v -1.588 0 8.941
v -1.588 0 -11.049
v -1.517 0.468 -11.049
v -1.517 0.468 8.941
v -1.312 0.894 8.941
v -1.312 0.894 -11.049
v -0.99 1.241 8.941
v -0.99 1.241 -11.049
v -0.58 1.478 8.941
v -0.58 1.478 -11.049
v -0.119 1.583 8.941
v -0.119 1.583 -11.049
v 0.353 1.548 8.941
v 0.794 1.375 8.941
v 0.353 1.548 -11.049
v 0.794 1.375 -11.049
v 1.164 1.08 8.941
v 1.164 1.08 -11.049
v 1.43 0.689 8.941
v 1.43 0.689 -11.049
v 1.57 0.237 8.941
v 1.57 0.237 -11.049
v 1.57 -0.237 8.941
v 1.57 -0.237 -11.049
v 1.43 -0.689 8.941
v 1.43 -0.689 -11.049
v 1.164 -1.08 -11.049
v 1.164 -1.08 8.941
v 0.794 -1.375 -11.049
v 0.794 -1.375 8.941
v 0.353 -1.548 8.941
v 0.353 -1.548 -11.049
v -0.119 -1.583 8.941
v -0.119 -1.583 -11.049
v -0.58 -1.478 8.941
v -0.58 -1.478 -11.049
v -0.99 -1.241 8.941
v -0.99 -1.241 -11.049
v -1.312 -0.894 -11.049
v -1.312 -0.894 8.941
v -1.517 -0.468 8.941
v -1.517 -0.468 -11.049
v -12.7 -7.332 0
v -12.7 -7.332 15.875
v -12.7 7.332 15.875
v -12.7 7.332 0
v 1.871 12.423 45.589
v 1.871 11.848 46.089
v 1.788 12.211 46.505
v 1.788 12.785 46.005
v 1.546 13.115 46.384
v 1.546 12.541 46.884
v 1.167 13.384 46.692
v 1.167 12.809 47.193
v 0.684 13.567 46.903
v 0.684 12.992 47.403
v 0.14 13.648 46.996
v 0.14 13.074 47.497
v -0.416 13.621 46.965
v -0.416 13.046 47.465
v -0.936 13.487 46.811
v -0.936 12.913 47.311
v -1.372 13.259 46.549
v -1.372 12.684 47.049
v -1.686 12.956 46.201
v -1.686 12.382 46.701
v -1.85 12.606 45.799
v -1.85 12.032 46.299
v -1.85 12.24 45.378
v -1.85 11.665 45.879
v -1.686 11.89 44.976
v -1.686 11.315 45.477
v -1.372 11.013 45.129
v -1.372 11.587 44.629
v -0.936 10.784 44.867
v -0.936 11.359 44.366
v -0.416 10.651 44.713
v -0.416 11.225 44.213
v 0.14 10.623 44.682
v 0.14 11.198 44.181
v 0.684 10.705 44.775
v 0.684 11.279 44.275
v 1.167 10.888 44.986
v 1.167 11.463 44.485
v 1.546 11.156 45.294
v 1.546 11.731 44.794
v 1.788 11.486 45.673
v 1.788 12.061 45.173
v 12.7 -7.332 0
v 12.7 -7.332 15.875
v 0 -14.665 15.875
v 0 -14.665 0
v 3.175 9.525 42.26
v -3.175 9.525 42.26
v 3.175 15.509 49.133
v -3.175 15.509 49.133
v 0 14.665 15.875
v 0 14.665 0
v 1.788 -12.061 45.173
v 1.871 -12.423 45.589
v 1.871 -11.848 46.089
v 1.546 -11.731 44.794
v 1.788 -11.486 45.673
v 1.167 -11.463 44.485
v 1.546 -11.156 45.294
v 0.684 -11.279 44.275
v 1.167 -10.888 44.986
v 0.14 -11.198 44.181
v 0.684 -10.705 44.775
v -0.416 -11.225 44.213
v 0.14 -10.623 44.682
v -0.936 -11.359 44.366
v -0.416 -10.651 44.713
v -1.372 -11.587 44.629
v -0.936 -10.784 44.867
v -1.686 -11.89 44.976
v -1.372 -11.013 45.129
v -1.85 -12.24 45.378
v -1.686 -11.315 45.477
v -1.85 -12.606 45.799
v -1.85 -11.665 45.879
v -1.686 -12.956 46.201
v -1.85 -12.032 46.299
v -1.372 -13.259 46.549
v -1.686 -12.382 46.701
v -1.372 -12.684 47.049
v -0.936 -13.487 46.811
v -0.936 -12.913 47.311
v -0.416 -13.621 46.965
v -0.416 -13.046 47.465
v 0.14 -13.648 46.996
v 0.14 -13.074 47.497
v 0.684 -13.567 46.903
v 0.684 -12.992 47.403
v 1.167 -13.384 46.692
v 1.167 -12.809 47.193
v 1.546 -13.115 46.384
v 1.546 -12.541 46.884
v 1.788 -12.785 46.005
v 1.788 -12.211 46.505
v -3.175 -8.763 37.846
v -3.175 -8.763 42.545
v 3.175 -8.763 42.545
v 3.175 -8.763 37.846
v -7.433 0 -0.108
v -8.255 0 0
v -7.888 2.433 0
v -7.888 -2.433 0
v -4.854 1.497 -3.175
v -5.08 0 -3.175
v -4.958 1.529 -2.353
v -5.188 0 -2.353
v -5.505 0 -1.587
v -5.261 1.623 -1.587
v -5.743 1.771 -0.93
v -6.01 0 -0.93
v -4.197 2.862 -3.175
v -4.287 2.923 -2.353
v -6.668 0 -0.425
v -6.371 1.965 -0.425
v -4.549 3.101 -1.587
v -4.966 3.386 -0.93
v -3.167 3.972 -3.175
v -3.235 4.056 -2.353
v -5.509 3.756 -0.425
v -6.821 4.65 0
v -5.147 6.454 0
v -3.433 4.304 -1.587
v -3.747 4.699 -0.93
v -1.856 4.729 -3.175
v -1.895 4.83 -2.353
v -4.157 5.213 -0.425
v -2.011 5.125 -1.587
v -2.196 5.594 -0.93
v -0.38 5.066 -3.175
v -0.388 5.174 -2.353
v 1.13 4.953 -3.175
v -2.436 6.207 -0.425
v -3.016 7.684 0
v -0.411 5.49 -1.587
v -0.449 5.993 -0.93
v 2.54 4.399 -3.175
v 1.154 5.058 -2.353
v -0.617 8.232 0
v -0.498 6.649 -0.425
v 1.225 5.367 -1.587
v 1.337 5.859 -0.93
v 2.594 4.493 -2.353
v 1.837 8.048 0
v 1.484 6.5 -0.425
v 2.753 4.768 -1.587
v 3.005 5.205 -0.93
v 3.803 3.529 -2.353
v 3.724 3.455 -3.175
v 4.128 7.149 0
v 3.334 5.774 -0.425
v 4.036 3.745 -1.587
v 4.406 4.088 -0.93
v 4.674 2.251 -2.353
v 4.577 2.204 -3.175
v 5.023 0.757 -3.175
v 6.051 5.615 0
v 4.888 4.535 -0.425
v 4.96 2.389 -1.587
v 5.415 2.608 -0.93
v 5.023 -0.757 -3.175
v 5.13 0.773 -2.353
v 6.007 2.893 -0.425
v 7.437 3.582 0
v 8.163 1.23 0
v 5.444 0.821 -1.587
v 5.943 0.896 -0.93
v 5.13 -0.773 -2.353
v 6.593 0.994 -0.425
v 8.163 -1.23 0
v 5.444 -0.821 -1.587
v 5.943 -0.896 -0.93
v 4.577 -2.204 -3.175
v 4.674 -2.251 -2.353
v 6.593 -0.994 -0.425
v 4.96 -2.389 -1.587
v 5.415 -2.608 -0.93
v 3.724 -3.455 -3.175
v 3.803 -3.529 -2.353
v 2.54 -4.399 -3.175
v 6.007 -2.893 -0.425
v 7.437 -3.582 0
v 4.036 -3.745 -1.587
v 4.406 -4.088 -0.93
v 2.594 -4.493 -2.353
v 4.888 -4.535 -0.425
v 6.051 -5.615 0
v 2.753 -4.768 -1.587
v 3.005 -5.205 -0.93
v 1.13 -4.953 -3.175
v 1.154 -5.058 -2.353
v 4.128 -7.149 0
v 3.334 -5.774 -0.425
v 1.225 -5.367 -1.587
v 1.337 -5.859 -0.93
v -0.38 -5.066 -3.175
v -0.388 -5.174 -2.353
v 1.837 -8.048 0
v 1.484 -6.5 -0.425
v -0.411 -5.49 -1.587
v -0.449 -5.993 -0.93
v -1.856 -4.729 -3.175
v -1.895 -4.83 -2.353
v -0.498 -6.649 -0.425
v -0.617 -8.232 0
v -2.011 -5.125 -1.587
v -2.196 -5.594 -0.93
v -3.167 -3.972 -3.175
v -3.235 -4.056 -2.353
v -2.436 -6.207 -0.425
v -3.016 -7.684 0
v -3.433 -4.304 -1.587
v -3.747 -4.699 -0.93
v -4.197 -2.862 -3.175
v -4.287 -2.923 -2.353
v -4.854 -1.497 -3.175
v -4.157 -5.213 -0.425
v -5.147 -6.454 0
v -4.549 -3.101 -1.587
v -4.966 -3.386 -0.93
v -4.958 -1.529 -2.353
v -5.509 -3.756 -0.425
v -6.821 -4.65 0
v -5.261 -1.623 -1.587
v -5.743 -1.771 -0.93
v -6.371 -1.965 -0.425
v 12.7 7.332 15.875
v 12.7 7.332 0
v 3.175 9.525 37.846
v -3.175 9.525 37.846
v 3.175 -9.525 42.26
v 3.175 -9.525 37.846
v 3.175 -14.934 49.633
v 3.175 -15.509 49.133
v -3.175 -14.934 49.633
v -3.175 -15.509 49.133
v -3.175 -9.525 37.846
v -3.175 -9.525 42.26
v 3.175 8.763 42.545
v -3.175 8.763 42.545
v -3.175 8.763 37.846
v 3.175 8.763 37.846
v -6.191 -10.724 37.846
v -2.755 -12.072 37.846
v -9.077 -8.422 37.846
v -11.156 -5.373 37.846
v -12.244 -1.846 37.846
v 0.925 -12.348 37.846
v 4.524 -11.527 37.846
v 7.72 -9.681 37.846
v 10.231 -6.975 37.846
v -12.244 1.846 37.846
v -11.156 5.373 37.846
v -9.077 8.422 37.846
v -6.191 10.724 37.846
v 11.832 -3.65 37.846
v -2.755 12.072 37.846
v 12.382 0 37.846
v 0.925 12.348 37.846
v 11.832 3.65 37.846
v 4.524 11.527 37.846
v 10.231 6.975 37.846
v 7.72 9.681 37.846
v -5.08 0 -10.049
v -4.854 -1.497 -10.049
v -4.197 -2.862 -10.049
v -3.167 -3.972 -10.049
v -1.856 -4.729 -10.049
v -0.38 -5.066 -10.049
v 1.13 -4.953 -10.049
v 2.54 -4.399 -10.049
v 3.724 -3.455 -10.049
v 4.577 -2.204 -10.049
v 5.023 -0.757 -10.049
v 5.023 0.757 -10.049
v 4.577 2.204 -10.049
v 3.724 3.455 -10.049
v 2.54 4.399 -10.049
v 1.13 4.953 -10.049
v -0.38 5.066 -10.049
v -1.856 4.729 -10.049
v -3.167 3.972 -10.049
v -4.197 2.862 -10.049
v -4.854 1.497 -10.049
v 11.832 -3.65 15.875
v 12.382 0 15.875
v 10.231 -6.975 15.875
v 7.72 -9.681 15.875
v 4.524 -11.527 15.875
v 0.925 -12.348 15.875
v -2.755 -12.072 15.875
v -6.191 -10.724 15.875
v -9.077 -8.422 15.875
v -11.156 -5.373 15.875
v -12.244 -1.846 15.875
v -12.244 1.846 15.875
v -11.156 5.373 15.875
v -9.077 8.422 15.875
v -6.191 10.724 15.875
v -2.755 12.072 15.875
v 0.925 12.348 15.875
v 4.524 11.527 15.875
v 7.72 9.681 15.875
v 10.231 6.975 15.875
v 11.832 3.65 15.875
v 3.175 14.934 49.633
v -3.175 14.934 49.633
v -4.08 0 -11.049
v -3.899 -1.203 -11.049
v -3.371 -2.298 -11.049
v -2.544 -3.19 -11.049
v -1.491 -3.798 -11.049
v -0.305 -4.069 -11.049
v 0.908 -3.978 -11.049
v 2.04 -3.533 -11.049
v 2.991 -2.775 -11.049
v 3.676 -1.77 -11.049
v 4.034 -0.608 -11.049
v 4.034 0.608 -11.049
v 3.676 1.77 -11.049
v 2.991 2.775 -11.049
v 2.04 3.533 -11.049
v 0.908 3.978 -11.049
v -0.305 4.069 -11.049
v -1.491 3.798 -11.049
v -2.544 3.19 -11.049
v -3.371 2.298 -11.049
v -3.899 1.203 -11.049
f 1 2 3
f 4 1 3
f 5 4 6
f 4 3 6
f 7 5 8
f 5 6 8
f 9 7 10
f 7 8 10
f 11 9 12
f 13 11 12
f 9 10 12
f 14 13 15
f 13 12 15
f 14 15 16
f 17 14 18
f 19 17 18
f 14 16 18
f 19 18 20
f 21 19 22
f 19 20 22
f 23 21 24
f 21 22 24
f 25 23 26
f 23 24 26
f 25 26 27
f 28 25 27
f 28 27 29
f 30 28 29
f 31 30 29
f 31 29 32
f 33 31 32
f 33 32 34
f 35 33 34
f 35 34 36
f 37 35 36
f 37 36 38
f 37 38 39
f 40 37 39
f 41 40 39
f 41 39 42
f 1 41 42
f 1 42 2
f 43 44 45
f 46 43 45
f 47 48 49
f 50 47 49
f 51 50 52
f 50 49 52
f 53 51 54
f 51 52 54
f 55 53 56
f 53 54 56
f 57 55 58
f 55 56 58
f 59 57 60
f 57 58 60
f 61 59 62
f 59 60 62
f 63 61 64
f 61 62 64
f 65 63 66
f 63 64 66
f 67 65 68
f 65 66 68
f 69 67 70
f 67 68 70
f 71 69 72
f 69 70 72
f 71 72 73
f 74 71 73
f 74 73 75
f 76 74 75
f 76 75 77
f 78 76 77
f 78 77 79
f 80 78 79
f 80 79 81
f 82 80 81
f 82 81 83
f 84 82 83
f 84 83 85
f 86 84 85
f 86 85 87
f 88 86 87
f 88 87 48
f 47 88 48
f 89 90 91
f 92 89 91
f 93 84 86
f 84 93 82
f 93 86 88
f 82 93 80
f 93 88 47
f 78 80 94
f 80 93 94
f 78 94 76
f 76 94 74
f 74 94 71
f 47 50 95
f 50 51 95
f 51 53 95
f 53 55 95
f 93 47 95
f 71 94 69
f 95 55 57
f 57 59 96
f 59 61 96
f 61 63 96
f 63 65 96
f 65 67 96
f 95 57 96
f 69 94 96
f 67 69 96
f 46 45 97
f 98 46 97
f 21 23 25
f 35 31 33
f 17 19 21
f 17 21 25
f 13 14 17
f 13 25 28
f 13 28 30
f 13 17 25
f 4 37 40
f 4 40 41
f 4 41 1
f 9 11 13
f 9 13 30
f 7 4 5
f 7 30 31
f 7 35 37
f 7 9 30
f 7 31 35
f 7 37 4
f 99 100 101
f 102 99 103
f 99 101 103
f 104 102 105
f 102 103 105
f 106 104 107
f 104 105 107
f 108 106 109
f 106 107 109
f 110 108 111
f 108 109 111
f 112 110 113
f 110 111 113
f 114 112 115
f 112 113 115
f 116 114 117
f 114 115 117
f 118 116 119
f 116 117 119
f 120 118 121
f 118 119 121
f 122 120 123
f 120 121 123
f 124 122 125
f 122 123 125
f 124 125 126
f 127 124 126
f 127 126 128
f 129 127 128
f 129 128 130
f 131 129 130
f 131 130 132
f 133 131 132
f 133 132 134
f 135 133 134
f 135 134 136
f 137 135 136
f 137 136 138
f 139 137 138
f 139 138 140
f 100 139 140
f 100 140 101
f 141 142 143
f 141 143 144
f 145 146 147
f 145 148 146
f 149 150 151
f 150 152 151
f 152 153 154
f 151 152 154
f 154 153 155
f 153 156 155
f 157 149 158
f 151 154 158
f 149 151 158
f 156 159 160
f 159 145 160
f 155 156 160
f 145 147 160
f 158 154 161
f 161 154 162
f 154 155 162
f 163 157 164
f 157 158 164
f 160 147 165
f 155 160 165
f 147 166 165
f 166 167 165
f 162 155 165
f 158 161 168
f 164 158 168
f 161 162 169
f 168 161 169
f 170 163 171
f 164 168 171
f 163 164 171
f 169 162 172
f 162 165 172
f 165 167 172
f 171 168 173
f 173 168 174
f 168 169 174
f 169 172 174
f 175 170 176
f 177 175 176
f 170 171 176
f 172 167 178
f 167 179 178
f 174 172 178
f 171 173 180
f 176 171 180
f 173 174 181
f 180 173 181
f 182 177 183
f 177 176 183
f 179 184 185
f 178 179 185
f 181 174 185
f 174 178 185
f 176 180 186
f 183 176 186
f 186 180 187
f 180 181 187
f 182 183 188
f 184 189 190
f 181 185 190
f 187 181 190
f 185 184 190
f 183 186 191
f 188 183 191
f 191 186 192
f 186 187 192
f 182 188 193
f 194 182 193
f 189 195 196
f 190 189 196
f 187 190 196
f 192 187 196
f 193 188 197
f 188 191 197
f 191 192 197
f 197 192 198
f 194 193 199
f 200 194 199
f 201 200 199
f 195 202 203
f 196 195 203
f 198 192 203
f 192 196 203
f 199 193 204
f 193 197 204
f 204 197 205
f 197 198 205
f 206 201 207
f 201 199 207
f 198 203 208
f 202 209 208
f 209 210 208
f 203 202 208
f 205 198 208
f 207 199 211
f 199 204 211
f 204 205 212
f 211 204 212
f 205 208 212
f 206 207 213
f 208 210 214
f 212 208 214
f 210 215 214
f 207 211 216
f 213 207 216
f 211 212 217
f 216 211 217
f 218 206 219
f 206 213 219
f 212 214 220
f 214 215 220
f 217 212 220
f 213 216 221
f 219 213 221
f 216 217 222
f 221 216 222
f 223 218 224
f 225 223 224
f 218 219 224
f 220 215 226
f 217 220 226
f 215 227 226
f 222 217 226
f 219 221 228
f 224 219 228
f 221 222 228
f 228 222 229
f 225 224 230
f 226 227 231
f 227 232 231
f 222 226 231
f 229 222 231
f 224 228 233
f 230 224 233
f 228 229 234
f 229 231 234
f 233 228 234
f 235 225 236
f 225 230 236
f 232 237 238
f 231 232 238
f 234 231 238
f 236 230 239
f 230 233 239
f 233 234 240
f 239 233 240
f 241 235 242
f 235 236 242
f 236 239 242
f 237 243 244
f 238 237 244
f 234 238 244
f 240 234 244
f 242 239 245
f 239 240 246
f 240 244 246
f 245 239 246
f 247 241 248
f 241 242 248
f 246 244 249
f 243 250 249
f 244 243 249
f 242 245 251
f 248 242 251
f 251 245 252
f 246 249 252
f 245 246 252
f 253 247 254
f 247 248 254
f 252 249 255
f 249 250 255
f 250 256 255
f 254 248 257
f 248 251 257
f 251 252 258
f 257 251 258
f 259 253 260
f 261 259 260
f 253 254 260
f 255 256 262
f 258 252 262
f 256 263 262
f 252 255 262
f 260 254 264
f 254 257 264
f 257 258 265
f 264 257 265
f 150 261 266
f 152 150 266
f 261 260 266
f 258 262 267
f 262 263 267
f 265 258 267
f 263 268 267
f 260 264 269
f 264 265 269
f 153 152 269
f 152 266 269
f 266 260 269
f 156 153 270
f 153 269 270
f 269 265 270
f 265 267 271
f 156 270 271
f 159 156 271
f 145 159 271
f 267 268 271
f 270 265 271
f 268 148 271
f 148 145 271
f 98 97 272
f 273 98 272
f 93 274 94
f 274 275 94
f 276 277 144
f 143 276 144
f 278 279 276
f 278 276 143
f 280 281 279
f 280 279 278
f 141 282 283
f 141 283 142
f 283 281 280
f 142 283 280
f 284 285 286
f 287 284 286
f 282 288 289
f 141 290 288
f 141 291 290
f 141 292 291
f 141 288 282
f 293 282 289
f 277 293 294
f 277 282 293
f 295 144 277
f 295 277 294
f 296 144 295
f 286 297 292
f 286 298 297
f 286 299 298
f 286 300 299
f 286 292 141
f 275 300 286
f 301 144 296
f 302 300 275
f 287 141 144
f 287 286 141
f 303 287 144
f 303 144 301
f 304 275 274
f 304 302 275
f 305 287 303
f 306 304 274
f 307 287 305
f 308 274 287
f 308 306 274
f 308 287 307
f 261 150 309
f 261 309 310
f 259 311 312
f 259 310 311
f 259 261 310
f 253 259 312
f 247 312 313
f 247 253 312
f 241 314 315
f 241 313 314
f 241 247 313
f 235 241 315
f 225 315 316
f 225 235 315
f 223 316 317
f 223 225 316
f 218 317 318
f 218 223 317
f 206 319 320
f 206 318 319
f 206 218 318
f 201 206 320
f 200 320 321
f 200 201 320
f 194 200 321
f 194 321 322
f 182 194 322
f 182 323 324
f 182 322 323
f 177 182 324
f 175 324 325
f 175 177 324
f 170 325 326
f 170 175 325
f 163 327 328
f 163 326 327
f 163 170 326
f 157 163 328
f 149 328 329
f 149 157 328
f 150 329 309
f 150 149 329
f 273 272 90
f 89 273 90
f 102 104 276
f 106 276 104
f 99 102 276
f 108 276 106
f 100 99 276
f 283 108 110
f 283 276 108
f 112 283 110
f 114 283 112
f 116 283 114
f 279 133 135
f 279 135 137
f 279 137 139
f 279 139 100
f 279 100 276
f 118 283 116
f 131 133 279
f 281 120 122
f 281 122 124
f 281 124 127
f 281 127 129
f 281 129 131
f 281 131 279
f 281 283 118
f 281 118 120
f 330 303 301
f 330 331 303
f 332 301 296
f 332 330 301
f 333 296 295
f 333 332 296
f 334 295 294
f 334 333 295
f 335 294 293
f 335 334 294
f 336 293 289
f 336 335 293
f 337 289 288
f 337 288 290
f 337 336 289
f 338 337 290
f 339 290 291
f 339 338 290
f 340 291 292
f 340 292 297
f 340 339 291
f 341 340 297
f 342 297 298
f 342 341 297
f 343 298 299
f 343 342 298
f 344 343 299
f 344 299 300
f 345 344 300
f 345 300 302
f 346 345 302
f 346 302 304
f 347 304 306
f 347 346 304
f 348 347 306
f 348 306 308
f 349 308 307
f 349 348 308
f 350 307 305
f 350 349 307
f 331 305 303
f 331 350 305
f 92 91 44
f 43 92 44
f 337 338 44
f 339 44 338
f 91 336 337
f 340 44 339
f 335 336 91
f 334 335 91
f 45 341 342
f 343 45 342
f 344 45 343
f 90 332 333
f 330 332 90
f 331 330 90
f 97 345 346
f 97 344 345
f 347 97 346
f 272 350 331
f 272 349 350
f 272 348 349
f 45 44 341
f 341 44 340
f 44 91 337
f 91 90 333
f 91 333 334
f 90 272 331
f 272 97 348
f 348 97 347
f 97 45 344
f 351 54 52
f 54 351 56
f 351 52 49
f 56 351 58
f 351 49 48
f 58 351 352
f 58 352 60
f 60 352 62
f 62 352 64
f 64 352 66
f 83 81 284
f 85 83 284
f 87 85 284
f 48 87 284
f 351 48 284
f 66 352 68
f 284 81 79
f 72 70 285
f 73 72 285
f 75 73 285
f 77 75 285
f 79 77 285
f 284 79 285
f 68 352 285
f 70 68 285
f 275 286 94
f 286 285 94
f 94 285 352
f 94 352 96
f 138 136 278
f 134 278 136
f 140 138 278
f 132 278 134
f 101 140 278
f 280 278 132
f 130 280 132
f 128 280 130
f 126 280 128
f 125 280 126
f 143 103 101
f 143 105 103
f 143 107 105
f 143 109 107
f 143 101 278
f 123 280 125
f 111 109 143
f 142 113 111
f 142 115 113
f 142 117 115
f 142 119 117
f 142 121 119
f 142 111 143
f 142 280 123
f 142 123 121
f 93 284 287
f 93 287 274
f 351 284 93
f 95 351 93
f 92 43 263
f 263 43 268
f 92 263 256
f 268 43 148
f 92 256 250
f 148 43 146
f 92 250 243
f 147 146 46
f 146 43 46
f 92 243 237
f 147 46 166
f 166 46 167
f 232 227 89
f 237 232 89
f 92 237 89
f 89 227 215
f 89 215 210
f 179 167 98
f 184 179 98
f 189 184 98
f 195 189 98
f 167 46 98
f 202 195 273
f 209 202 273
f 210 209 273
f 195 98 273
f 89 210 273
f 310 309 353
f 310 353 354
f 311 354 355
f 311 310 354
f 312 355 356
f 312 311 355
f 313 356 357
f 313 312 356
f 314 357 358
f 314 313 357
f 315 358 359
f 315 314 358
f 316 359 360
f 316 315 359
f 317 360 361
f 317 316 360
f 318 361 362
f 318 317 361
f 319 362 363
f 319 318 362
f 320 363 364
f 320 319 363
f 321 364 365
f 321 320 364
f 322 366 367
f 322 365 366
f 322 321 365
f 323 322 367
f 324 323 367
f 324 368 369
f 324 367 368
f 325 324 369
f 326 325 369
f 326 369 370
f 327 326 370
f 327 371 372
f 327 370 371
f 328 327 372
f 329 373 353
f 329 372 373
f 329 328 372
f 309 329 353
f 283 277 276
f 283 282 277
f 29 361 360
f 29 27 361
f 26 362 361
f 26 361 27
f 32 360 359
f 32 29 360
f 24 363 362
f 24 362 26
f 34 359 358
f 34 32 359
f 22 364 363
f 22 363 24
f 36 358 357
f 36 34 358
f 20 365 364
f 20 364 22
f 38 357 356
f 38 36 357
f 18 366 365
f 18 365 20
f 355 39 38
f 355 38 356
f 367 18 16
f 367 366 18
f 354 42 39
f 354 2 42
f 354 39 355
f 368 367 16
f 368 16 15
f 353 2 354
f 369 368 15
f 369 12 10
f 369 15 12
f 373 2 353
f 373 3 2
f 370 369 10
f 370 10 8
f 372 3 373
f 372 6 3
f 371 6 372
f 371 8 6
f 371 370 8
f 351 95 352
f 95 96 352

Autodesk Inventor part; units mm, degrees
ref_plane "YZ Plane" through (0, 0, 0) normal (1, 0, 0) x (0, 1, 0)
ref_plane "XZ Plane" through (0, 0, 0) normal (0, 1, 0) x (-1, 0, 0)
ref_plane "XY Plane" through (0, 0, 0) normal (0, 0, 1) x (1, 0, 0)
sketch "Sketch1" plane through (0, 0, 0) normal (0, 0, 1) x (1, 0, 0)
  line L0 (0, 14.6647) -> (12.7, 7.3323)
  line L1 (12.7, 7.3323) -> (12.7, -7.3323)
  line L2 (12.7, -7.3323) -> (0, -14.6647)
  line L3 (0, -14.6647) -> (-12.7, -7.3323)
  line L4 (-12.7, -7.3323) -> (-12.7, 7.3323)
  line L5 (-12.7, 7.3323) -> (0, 14.6647)
  line L6 (0, 14.6647) -> (0, 0)
  dimension "d0" = 25.4
extrude "Extrusion1" add sketch "Sketch1" along normal blind 15.875
sketch "Sketch2" plane through (0, 0, 0) normal (0, 0, -1) x (-1, 0, 0)
  line L0 (12.7, -7.3323) -> (12.7, 7.3323) projected
  line L1 (12.7, 7.3323) -> (0, 14.6647) projected
  line L2 (0, 14.6647) -> (-12.7, 7.3323) projected
  line L3 (-12.7, 7.3323) -> (-12.7, -7.3323) projected
  line L4 (-12.7, -7.3323) -> (0, -14.6647) projected
  line L5 (0, -14.6647) -> (12.7, -7.3323) projected
  line L6 (-6.35, 10.9985) -> (6.35, -10.9985) construction
  circle A0 centre (0, 0) radius 5.08
  dimension "d3" = 10.16
extrude "Extrusion2" add sketch "Sketch2" along normal blind 11.049 contours A0
sketch "Sketch3" plane through (0, 0, -11.049) normal (0, 0, -1) x (-1, 0, 0)
  circle A0 centre (0, 0) radius 5.08 projected
  circle A1 centre (0, 0) radius 1.5875
  dimension "d6" = 3.175
extrude "Extrusion3" cut sketch "Sketch3" against normal blind 19.9898 contours A1
sketch "Sketch4" plane through (0, 0, 15.875) normal (0, 0, 1) x (1, 0, 0)
  line L0 (12.7, 7.3323) -> (12.7, -7.3323) projected
  line L1 (0, 14.6647) -> (12.7, 7.3323) projected
  line L2 (-12.7, 7.3323) -> (0, 14.6647) projected
  line L3 (-12.7, -7.3323) -> (-12.7, 7.3323) projected
  line L4 (0, -14.6647) -> (-12.7, -7.3323) projected
  line L5 (12.7, -7.3323) -> (0, -14.6647) projected
  line L6 (-6.35, 10.9985) -> (6.35, -10.9985)
  circle A0 centre (0, 0) radius 12.3825
  dimension "d9" = 24.765
extrude "Extrusion4" add sketch "Sketch4" along normal blind 21.971 contours A0 L6 | L6 A0
sketch "Sketch5" plane through (0, 0, 0) normal (1, 0, 0) x (0, 1, 0)
  line L0 (12.3825, 15.875) -> (12.3825, 37.846) projected
  line L1 (-12.3825, 37.846) -> (12.3825, 37.846) projected
  line L2 (-12.3825, 15.875) -> (12.3825, 15.875) projected
  line L3 (9.525, 37.846) -> (9.525, 42.2598)
  line L4 (9.525, 42.2598) -> (15.5086, 49.1328)
  line L5 (15.5086, 49.1328) -> (14.9339, 49.6332)
  line L6 (14.9339, 49.6332) -> (8.763, 42.545)
  line L7 (8.763, 42.545) -> (8.763, 37.846)
  line L8 (0, 37.846) -> (0, 32.3818)
  line L9 (-12.3825, 15.875) -> (-12.3825, 37.846)
  line L10 (12.3825, 37.846) -> (-12.3825, 37.846)
  line L11 (-9.525, 37.846) -> (-9.525, 42.2598)
  line L12 (-9.525, 42.2598) -> (-15.5086, 49.1328)
  line L13 (-15.5086, 49.1328) -> (-14.9339, 49.6332)
  line L14 (-14.9339, 49.6332) -> (-8.763, 42.545)
  line L15 (-8.763, 42.545) -> (-8.763, 37.846)
  dimension "d12" = 19.05
  dimension "d13" = 0.762
  dimension "d14" = 0.762
  dimension "d15" = 4.699
  dimension "d17" = 9.398
extrude "Extrusion5" add sketch "Sketch5" along normal mid plane 6.35 contours L1 L7 L6 L5 L4 L3 | L11 L12 L13 L14 L15 L1
sketch "Sketch6" plane through (-3.175, -8.763, 42.545) normal (0, 0.7542, 0.6566) x (1, 0, 0)
  line L0 (6.35, -9.398) -> (6.35, 0) projected
  line L1 (0, 0) -> (6.35, 0) projected
  line L2 (0, 0) -> (0, -9.398) projected
  line L3 (0, -9.398) -> (6.35, -9.398) projected
  circle A0 centre (3.175, -4.699) radius 1.8713
extrude "Extrusion6" cut sketch "Sketch6" against normal blind 6.35 contours A0
mirror "Mirror1" about plane through (0, 0, 0) normal (0, 1, 0) of "Extrusion6"
thread "Thread1" size "1/8" designation "1/8 - 27 NPT" standard "NPT" full length
chamfer "Chamfer1" distance 1 angle 45 1 edges at (5.08, 0, -11.049)
fillet "Fillet1" radius 3.175 1 edges at (5.08, 0, 0)
equation "\"d14\" = d13"
properties part number "SM-2B-115R"
